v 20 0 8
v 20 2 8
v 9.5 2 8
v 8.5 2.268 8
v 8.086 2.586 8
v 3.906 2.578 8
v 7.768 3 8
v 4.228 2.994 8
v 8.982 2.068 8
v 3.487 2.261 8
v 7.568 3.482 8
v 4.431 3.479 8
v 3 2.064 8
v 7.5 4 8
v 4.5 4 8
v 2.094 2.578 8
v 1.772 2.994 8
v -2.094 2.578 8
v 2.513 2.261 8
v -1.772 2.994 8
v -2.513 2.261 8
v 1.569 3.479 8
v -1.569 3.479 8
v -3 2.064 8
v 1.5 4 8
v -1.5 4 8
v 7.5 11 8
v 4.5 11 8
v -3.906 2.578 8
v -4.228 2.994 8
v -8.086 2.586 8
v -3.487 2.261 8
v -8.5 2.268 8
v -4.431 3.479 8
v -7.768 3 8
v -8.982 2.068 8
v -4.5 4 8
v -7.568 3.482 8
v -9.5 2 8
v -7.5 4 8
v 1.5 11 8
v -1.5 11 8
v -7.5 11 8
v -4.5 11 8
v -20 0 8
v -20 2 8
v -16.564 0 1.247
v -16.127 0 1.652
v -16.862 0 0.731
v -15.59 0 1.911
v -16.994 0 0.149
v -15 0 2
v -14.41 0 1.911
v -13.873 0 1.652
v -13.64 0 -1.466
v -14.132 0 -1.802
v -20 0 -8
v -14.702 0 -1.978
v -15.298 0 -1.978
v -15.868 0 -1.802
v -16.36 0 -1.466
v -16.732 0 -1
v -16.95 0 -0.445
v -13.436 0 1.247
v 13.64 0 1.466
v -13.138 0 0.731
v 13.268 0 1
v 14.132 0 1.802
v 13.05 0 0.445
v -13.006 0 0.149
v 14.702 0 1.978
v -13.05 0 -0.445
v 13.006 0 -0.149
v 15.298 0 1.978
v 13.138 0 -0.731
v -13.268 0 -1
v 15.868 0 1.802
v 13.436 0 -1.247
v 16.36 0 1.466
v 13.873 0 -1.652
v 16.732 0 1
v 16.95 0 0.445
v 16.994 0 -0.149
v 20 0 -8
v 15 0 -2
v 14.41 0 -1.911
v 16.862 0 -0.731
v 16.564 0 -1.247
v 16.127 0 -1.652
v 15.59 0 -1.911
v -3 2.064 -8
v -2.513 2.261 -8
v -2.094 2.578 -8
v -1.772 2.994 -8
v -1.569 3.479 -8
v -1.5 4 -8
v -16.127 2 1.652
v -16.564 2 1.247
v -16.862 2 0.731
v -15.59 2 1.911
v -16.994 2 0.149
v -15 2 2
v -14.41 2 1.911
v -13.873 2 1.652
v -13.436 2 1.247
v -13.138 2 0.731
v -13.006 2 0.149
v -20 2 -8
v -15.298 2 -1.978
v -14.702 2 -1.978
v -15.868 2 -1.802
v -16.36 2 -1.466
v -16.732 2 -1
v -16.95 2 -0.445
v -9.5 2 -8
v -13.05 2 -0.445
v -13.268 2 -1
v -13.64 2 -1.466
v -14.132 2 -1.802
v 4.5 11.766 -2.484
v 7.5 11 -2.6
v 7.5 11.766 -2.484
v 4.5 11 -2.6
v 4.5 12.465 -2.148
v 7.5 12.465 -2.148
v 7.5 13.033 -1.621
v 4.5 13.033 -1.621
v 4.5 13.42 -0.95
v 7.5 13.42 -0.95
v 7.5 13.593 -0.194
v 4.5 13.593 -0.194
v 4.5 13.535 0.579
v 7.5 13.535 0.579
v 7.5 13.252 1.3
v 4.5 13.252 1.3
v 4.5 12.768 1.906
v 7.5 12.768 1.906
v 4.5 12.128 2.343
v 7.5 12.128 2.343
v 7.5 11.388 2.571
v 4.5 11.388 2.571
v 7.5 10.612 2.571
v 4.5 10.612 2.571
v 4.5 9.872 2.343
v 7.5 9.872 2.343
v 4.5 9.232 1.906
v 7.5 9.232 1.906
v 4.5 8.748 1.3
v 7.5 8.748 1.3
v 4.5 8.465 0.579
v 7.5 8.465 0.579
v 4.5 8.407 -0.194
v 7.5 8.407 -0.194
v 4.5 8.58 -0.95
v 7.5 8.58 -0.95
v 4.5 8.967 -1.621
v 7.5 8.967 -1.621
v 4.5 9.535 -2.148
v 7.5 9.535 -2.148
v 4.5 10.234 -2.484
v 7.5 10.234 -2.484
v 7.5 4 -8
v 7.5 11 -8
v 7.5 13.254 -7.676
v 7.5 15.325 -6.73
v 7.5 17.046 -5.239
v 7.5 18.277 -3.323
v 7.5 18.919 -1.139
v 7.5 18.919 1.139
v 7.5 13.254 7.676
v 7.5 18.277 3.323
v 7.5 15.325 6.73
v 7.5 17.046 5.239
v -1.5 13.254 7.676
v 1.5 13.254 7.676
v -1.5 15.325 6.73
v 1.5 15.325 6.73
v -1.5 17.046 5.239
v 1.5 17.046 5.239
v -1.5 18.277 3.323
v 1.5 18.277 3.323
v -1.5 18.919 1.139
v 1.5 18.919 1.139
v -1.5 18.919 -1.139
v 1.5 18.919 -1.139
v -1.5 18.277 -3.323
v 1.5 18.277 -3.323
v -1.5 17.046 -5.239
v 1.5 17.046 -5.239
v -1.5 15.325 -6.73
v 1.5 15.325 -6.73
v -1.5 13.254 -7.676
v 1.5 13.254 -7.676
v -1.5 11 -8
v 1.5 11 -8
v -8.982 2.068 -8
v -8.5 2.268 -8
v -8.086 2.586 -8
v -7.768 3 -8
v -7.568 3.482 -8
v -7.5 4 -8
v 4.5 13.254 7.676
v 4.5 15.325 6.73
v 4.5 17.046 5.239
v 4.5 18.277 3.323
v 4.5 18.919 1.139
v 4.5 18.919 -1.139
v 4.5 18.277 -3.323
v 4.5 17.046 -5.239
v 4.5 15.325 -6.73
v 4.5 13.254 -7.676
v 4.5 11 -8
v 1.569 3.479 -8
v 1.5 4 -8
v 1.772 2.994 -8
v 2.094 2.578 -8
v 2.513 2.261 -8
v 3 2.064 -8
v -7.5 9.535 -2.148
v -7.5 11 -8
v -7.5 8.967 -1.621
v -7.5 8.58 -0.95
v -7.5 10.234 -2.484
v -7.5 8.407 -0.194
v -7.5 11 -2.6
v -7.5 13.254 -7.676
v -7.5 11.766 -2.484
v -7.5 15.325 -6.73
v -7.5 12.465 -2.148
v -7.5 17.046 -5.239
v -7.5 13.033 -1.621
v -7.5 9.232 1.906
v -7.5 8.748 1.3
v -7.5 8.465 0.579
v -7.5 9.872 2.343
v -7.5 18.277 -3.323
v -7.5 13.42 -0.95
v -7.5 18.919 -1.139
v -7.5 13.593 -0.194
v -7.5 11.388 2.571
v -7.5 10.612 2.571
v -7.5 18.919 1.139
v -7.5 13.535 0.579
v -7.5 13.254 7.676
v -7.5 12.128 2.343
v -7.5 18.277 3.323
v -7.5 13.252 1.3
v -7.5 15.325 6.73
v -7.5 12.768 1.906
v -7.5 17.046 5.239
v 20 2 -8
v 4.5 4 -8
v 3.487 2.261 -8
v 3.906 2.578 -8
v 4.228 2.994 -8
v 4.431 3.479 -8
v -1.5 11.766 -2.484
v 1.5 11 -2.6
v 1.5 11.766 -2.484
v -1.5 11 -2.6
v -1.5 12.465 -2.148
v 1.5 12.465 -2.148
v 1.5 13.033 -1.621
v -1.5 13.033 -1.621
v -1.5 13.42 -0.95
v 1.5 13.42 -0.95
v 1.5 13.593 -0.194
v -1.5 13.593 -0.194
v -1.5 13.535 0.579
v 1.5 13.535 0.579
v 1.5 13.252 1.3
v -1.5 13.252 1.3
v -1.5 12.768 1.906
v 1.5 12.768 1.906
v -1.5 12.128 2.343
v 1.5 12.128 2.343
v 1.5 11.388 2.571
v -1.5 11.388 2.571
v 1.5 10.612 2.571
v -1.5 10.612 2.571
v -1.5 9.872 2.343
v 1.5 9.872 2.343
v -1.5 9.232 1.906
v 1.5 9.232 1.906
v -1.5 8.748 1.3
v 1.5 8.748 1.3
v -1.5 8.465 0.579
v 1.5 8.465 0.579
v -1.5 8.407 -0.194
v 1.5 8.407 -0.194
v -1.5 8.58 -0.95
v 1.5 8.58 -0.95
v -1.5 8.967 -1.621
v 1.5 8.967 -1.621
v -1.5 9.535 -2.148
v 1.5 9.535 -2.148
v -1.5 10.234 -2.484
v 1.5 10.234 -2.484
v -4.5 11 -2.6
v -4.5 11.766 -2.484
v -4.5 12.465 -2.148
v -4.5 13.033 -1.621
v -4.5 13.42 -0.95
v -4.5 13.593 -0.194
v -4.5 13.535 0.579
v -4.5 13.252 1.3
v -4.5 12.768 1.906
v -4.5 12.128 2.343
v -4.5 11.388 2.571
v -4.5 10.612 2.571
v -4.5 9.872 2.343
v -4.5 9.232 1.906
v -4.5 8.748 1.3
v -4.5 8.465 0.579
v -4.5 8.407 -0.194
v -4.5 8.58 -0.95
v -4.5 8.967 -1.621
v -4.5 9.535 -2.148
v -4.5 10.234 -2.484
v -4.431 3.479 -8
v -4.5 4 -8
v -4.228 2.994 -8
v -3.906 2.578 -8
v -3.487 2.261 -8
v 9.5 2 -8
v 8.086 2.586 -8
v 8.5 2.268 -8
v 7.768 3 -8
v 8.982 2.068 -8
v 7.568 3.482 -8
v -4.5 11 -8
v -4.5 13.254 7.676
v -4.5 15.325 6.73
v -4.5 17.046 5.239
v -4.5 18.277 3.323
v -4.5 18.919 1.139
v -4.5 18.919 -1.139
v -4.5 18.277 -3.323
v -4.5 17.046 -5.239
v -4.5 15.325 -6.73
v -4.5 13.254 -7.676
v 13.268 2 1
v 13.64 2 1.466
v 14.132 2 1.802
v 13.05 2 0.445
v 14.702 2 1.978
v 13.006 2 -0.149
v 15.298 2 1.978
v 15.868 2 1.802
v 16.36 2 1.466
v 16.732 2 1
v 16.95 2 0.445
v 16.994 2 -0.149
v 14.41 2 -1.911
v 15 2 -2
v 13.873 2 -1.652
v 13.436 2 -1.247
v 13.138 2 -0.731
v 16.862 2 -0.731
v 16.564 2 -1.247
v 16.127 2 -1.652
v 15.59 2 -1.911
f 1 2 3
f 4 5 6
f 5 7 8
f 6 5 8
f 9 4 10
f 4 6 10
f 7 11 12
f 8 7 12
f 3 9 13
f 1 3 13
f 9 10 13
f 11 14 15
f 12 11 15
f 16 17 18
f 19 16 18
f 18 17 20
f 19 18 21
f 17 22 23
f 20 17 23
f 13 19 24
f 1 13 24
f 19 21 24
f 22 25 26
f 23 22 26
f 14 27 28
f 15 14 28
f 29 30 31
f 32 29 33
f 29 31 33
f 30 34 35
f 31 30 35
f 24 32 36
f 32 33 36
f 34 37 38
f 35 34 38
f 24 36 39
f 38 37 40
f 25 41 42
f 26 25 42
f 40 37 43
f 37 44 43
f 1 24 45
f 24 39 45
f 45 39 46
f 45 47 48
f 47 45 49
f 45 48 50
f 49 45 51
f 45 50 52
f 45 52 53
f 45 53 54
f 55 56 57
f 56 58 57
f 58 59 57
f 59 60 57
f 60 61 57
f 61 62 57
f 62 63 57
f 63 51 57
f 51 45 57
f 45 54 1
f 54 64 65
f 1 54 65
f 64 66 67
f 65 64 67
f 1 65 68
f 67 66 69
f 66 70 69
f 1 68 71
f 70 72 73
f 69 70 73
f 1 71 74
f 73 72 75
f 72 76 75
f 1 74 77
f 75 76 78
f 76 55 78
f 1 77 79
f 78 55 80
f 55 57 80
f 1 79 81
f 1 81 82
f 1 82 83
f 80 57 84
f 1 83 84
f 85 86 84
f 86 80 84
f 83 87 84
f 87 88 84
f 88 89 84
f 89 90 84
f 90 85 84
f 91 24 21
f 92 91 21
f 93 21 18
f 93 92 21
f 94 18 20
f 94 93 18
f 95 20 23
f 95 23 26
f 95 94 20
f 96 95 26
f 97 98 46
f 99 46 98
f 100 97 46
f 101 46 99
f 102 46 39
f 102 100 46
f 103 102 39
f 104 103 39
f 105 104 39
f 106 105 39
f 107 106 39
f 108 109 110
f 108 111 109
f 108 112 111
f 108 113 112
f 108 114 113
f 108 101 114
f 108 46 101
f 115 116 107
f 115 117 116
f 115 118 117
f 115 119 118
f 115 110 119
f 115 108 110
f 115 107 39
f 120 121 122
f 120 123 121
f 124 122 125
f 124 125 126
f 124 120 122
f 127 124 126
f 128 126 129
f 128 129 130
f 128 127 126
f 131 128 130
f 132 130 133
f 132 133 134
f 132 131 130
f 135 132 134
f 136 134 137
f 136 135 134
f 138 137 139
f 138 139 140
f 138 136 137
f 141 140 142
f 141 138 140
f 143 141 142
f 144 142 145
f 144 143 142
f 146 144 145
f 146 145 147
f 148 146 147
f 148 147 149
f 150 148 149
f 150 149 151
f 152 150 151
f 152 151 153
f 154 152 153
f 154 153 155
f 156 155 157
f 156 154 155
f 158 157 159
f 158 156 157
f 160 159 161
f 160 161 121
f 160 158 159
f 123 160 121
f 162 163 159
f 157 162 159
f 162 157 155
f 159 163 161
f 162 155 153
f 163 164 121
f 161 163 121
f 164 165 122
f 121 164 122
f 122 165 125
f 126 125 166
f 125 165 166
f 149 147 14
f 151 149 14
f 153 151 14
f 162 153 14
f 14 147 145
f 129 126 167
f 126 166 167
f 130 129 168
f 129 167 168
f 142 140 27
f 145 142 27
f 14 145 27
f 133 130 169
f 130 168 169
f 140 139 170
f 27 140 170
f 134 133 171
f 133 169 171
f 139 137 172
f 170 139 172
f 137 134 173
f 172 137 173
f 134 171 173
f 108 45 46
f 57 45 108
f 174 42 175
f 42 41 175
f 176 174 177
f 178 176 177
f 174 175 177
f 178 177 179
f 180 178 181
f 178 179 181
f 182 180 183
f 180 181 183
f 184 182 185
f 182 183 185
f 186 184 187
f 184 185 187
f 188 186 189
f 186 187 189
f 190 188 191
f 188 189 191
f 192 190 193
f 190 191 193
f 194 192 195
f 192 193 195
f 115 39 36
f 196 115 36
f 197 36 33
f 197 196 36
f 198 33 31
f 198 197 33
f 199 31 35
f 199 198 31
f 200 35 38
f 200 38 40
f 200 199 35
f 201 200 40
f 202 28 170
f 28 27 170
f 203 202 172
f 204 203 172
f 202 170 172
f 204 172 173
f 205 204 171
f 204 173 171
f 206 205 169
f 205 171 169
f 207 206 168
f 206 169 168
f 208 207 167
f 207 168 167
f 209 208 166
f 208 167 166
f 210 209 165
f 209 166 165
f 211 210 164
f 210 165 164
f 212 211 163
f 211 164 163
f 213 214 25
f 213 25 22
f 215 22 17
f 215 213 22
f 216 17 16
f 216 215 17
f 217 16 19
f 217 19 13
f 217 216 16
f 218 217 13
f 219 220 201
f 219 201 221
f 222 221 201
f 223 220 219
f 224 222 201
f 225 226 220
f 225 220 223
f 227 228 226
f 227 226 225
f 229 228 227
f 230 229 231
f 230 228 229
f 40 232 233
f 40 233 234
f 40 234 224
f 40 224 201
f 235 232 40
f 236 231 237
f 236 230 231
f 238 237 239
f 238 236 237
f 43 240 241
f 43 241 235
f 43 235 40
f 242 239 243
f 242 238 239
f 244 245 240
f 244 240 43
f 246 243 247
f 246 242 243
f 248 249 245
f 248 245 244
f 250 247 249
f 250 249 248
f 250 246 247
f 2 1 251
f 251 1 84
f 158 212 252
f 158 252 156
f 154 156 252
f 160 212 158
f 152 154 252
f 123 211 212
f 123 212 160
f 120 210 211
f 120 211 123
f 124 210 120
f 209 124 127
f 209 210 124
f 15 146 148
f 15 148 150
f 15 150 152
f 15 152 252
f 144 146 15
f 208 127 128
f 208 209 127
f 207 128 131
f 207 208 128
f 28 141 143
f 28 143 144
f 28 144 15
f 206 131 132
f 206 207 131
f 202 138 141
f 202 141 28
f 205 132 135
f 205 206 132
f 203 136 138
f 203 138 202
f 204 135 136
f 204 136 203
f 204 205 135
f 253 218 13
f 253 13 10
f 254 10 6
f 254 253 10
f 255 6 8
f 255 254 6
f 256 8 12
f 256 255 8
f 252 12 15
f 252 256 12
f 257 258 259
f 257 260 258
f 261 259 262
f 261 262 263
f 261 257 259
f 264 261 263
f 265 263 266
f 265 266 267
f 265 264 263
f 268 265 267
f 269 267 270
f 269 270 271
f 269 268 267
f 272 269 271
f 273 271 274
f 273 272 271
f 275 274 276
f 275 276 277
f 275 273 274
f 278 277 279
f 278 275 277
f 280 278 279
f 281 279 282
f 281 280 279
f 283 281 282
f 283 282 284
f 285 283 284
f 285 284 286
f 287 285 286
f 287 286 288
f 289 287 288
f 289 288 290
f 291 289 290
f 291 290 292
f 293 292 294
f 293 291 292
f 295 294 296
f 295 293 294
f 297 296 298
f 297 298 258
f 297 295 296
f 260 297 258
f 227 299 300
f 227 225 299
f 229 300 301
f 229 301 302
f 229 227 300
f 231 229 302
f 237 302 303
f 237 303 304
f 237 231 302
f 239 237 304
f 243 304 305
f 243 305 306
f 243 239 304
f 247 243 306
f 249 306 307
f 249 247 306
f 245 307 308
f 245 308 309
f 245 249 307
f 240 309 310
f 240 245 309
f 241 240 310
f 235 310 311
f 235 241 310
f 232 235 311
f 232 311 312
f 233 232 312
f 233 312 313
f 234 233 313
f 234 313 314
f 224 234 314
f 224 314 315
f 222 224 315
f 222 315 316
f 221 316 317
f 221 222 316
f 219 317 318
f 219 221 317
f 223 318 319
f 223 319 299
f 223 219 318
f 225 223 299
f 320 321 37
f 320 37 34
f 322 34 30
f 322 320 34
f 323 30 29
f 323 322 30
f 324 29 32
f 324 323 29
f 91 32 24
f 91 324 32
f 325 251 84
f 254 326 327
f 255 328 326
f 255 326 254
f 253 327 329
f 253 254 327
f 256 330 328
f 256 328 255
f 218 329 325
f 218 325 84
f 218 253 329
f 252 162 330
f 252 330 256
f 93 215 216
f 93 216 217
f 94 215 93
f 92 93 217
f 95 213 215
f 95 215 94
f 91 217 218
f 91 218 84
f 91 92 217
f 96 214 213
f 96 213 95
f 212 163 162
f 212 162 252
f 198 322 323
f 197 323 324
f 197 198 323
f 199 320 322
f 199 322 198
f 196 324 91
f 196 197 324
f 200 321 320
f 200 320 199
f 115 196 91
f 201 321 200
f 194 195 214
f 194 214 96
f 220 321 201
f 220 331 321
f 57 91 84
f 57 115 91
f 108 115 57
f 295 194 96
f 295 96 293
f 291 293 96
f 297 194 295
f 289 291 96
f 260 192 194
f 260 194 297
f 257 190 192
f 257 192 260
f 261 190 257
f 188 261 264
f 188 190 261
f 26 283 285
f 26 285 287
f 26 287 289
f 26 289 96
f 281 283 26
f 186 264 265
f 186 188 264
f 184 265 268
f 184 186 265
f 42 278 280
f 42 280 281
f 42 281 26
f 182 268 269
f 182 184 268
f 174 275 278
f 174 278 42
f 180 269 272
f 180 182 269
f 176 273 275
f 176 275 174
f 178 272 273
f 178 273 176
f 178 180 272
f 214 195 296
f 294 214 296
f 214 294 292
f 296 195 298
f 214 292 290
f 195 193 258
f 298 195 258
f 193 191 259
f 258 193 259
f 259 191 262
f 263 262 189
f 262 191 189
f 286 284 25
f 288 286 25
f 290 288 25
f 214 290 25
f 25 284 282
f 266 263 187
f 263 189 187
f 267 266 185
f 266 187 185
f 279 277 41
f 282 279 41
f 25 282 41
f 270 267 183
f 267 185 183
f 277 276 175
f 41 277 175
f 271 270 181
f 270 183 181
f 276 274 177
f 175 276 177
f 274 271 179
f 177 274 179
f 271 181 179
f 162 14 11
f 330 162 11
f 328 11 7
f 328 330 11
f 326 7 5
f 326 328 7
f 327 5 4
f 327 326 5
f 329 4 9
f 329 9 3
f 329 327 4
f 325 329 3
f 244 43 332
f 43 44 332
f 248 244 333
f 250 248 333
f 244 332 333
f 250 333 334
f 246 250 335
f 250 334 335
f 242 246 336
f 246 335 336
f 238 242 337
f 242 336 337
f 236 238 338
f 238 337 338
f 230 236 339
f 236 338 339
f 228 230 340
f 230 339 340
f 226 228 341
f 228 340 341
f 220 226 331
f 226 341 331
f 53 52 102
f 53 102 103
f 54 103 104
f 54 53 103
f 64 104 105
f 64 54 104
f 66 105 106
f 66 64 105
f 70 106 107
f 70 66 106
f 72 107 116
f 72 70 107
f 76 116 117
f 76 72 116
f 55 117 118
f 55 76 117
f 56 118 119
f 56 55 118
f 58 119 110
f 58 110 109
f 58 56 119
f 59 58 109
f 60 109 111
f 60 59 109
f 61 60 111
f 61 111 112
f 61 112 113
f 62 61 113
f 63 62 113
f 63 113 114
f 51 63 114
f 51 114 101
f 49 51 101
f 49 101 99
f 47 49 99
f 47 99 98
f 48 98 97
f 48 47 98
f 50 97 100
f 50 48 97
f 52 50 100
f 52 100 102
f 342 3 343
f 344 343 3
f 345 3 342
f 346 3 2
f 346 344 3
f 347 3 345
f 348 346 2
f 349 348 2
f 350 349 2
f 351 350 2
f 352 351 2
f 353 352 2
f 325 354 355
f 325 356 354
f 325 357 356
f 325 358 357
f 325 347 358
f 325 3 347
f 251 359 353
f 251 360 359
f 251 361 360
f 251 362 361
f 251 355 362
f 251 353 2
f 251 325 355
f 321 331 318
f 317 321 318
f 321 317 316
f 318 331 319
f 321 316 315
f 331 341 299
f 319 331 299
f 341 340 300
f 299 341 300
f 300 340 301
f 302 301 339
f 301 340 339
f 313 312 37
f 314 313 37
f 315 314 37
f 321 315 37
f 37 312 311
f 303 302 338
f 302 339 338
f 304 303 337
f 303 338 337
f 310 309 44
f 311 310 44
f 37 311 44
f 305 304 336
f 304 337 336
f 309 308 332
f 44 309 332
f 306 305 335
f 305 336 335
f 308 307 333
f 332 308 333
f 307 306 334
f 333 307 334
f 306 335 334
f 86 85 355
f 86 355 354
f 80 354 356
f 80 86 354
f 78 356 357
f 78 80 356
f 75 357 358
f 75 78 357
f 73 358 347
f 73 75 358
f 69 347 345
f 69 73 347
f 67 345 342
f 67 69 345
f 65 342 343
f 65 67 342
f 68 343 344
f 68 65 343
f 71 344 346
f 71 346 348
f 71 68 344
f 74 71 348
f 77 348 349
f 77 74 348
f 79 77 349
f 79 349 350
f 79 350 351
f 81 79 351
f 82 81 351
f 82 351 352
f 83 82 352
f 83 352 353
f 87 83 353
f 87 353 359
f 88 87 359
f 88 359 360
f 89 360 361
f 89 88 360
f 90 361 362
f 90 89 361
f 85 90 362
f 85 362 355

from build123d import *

# Parameters (mm, degrees)
SKETCH_1_W                 = 40
SKETCH_1_H                 = 16
SKETCH_1_R                 = 2
EXTRUDE_1_DEPTH            = 2
SKETCH_2_R                 = 2.6
EXTRUDE_2_DEPTH            = 1.5
PATTERN_LINEAR_1_COUNT     = 2
PATTERN_LINEAR_1_PITCH     = 6
PATTERN_LINEAR_1_COL_COUNT = 2
PATTERN_LINEAR_1_COL_PITCH = 6
FILLET_1_R                 = 2


with BuildPart() as part:
    # 草圖1 → 填料-伸長1 (new body)
    with BuildSketch(Plane(origin=(0, 0, 0), x_dir=(1, 0, 0), z_dir=(0, 1, 0))):
        Rectangle(SKETCH_1_W, SKETCH_1_H)
        with Locations(Location((-15, 0, 0), (0, 0, 270))):
            Circle(SKETCH_1_R, mode=Mode.SUBTRACT)
        with Locations(Location((15, 0, 0), (0, 0, 90))):
            Circle(SKETCH_1_R, mode=Mode.SUBTRACT)
    extrude(amount=EXTRUDE_1_DEPTH)

    # 草圖2 → 填料-伸長2 (add, symmetric)
    with BuildSketch(Plane(origin=(0, 0, 0), x_dir=(0, 0, -1), z_dir=(1, 0, 0))):
        with BuildLine():
            Line((8, 2), (-8, 2))
            Line((-8, 2), (-8, 11))
            ThreePointArc((-8, 11), (0, 19), (8, 11))
            Line((8, 11), (8, 2))
        make_face()
        with Locations((0, 11)):
            Circle(SKETCH_2_R, mode=Mode.SUBTRACT)
    extrude_2 = extrude(amount=EXTRUDE_2_DEPTH, both=True)

    # 直線複製排列1: 填料-伸長2 ×2
    with Locations(*[(i * PATTERN_LINEAR_1_PITCH, 0, 0) for i in range(1, PATTERN_LINEAR_1_COUNT)]):
        add(extrude_2)

    # 直線複製排列1 col: 填料-伸長2 ×2
    with Locations(*[(-i * PATTERN_LINEAR_1_COL_PITCH, 0, 0) for i in range(1, PATTERN_LINEAR_1_COL_COUNT)]):
        add(extrude_2)

    # 圓角1
    # the kernel refuses this fillet: 2 mm, written as the material it adds along each edge
    with BuildSketch(Plane(origin=(1.5, 2, -8), x_dir=(0, 1, 0), z_dir=(0, 0, 1)), Plane(origin=(-1.5, 2, -8), x_dir=(-1, 0, 0), z_dir=(0, 0, 1)), Plane(origin=(-7.5, 2, -8), x_dir=(-1, 0, 0), z_dir=(0, 0, 1)), Plane(origin=(7.5, 2, -8), x_dir=(0, 1, 0), z_dir=(0, 0, 1)), Plane(origin=(4.5, 2, -8), x_dir=(-1, 0, 0), z_dir=(0, 0, 1))) as fillet_1_piece_1:
        with BuildLine():
            CenterArc((FILLET_1_R, -FILLET_1_R), FILLET_1_R, 90, 90)
            Line((0, -FILLET_1_R), (0, 0))
            Line((0, 0), (FILLET_1_R, 0))
        make_face()
    extrude(amount=16)
    with BuildSketch(Plane(origin=(-4.5, 2, -8), x_dir=(1, 0, 0), z_dir=(0, 0, 1))) as fillet_1_piece_2:
        with BuildLine():
            CenterArc((FILLET_1_R, FILLET_1_R), FILLET_1_R, 180, 90)
            Line((0, FILLET_1_R), (0, 0))
            Line((0, 0), (FILLET_1_R, 0))
        make_face()
    extrude(amount=16)


solid = part.part
